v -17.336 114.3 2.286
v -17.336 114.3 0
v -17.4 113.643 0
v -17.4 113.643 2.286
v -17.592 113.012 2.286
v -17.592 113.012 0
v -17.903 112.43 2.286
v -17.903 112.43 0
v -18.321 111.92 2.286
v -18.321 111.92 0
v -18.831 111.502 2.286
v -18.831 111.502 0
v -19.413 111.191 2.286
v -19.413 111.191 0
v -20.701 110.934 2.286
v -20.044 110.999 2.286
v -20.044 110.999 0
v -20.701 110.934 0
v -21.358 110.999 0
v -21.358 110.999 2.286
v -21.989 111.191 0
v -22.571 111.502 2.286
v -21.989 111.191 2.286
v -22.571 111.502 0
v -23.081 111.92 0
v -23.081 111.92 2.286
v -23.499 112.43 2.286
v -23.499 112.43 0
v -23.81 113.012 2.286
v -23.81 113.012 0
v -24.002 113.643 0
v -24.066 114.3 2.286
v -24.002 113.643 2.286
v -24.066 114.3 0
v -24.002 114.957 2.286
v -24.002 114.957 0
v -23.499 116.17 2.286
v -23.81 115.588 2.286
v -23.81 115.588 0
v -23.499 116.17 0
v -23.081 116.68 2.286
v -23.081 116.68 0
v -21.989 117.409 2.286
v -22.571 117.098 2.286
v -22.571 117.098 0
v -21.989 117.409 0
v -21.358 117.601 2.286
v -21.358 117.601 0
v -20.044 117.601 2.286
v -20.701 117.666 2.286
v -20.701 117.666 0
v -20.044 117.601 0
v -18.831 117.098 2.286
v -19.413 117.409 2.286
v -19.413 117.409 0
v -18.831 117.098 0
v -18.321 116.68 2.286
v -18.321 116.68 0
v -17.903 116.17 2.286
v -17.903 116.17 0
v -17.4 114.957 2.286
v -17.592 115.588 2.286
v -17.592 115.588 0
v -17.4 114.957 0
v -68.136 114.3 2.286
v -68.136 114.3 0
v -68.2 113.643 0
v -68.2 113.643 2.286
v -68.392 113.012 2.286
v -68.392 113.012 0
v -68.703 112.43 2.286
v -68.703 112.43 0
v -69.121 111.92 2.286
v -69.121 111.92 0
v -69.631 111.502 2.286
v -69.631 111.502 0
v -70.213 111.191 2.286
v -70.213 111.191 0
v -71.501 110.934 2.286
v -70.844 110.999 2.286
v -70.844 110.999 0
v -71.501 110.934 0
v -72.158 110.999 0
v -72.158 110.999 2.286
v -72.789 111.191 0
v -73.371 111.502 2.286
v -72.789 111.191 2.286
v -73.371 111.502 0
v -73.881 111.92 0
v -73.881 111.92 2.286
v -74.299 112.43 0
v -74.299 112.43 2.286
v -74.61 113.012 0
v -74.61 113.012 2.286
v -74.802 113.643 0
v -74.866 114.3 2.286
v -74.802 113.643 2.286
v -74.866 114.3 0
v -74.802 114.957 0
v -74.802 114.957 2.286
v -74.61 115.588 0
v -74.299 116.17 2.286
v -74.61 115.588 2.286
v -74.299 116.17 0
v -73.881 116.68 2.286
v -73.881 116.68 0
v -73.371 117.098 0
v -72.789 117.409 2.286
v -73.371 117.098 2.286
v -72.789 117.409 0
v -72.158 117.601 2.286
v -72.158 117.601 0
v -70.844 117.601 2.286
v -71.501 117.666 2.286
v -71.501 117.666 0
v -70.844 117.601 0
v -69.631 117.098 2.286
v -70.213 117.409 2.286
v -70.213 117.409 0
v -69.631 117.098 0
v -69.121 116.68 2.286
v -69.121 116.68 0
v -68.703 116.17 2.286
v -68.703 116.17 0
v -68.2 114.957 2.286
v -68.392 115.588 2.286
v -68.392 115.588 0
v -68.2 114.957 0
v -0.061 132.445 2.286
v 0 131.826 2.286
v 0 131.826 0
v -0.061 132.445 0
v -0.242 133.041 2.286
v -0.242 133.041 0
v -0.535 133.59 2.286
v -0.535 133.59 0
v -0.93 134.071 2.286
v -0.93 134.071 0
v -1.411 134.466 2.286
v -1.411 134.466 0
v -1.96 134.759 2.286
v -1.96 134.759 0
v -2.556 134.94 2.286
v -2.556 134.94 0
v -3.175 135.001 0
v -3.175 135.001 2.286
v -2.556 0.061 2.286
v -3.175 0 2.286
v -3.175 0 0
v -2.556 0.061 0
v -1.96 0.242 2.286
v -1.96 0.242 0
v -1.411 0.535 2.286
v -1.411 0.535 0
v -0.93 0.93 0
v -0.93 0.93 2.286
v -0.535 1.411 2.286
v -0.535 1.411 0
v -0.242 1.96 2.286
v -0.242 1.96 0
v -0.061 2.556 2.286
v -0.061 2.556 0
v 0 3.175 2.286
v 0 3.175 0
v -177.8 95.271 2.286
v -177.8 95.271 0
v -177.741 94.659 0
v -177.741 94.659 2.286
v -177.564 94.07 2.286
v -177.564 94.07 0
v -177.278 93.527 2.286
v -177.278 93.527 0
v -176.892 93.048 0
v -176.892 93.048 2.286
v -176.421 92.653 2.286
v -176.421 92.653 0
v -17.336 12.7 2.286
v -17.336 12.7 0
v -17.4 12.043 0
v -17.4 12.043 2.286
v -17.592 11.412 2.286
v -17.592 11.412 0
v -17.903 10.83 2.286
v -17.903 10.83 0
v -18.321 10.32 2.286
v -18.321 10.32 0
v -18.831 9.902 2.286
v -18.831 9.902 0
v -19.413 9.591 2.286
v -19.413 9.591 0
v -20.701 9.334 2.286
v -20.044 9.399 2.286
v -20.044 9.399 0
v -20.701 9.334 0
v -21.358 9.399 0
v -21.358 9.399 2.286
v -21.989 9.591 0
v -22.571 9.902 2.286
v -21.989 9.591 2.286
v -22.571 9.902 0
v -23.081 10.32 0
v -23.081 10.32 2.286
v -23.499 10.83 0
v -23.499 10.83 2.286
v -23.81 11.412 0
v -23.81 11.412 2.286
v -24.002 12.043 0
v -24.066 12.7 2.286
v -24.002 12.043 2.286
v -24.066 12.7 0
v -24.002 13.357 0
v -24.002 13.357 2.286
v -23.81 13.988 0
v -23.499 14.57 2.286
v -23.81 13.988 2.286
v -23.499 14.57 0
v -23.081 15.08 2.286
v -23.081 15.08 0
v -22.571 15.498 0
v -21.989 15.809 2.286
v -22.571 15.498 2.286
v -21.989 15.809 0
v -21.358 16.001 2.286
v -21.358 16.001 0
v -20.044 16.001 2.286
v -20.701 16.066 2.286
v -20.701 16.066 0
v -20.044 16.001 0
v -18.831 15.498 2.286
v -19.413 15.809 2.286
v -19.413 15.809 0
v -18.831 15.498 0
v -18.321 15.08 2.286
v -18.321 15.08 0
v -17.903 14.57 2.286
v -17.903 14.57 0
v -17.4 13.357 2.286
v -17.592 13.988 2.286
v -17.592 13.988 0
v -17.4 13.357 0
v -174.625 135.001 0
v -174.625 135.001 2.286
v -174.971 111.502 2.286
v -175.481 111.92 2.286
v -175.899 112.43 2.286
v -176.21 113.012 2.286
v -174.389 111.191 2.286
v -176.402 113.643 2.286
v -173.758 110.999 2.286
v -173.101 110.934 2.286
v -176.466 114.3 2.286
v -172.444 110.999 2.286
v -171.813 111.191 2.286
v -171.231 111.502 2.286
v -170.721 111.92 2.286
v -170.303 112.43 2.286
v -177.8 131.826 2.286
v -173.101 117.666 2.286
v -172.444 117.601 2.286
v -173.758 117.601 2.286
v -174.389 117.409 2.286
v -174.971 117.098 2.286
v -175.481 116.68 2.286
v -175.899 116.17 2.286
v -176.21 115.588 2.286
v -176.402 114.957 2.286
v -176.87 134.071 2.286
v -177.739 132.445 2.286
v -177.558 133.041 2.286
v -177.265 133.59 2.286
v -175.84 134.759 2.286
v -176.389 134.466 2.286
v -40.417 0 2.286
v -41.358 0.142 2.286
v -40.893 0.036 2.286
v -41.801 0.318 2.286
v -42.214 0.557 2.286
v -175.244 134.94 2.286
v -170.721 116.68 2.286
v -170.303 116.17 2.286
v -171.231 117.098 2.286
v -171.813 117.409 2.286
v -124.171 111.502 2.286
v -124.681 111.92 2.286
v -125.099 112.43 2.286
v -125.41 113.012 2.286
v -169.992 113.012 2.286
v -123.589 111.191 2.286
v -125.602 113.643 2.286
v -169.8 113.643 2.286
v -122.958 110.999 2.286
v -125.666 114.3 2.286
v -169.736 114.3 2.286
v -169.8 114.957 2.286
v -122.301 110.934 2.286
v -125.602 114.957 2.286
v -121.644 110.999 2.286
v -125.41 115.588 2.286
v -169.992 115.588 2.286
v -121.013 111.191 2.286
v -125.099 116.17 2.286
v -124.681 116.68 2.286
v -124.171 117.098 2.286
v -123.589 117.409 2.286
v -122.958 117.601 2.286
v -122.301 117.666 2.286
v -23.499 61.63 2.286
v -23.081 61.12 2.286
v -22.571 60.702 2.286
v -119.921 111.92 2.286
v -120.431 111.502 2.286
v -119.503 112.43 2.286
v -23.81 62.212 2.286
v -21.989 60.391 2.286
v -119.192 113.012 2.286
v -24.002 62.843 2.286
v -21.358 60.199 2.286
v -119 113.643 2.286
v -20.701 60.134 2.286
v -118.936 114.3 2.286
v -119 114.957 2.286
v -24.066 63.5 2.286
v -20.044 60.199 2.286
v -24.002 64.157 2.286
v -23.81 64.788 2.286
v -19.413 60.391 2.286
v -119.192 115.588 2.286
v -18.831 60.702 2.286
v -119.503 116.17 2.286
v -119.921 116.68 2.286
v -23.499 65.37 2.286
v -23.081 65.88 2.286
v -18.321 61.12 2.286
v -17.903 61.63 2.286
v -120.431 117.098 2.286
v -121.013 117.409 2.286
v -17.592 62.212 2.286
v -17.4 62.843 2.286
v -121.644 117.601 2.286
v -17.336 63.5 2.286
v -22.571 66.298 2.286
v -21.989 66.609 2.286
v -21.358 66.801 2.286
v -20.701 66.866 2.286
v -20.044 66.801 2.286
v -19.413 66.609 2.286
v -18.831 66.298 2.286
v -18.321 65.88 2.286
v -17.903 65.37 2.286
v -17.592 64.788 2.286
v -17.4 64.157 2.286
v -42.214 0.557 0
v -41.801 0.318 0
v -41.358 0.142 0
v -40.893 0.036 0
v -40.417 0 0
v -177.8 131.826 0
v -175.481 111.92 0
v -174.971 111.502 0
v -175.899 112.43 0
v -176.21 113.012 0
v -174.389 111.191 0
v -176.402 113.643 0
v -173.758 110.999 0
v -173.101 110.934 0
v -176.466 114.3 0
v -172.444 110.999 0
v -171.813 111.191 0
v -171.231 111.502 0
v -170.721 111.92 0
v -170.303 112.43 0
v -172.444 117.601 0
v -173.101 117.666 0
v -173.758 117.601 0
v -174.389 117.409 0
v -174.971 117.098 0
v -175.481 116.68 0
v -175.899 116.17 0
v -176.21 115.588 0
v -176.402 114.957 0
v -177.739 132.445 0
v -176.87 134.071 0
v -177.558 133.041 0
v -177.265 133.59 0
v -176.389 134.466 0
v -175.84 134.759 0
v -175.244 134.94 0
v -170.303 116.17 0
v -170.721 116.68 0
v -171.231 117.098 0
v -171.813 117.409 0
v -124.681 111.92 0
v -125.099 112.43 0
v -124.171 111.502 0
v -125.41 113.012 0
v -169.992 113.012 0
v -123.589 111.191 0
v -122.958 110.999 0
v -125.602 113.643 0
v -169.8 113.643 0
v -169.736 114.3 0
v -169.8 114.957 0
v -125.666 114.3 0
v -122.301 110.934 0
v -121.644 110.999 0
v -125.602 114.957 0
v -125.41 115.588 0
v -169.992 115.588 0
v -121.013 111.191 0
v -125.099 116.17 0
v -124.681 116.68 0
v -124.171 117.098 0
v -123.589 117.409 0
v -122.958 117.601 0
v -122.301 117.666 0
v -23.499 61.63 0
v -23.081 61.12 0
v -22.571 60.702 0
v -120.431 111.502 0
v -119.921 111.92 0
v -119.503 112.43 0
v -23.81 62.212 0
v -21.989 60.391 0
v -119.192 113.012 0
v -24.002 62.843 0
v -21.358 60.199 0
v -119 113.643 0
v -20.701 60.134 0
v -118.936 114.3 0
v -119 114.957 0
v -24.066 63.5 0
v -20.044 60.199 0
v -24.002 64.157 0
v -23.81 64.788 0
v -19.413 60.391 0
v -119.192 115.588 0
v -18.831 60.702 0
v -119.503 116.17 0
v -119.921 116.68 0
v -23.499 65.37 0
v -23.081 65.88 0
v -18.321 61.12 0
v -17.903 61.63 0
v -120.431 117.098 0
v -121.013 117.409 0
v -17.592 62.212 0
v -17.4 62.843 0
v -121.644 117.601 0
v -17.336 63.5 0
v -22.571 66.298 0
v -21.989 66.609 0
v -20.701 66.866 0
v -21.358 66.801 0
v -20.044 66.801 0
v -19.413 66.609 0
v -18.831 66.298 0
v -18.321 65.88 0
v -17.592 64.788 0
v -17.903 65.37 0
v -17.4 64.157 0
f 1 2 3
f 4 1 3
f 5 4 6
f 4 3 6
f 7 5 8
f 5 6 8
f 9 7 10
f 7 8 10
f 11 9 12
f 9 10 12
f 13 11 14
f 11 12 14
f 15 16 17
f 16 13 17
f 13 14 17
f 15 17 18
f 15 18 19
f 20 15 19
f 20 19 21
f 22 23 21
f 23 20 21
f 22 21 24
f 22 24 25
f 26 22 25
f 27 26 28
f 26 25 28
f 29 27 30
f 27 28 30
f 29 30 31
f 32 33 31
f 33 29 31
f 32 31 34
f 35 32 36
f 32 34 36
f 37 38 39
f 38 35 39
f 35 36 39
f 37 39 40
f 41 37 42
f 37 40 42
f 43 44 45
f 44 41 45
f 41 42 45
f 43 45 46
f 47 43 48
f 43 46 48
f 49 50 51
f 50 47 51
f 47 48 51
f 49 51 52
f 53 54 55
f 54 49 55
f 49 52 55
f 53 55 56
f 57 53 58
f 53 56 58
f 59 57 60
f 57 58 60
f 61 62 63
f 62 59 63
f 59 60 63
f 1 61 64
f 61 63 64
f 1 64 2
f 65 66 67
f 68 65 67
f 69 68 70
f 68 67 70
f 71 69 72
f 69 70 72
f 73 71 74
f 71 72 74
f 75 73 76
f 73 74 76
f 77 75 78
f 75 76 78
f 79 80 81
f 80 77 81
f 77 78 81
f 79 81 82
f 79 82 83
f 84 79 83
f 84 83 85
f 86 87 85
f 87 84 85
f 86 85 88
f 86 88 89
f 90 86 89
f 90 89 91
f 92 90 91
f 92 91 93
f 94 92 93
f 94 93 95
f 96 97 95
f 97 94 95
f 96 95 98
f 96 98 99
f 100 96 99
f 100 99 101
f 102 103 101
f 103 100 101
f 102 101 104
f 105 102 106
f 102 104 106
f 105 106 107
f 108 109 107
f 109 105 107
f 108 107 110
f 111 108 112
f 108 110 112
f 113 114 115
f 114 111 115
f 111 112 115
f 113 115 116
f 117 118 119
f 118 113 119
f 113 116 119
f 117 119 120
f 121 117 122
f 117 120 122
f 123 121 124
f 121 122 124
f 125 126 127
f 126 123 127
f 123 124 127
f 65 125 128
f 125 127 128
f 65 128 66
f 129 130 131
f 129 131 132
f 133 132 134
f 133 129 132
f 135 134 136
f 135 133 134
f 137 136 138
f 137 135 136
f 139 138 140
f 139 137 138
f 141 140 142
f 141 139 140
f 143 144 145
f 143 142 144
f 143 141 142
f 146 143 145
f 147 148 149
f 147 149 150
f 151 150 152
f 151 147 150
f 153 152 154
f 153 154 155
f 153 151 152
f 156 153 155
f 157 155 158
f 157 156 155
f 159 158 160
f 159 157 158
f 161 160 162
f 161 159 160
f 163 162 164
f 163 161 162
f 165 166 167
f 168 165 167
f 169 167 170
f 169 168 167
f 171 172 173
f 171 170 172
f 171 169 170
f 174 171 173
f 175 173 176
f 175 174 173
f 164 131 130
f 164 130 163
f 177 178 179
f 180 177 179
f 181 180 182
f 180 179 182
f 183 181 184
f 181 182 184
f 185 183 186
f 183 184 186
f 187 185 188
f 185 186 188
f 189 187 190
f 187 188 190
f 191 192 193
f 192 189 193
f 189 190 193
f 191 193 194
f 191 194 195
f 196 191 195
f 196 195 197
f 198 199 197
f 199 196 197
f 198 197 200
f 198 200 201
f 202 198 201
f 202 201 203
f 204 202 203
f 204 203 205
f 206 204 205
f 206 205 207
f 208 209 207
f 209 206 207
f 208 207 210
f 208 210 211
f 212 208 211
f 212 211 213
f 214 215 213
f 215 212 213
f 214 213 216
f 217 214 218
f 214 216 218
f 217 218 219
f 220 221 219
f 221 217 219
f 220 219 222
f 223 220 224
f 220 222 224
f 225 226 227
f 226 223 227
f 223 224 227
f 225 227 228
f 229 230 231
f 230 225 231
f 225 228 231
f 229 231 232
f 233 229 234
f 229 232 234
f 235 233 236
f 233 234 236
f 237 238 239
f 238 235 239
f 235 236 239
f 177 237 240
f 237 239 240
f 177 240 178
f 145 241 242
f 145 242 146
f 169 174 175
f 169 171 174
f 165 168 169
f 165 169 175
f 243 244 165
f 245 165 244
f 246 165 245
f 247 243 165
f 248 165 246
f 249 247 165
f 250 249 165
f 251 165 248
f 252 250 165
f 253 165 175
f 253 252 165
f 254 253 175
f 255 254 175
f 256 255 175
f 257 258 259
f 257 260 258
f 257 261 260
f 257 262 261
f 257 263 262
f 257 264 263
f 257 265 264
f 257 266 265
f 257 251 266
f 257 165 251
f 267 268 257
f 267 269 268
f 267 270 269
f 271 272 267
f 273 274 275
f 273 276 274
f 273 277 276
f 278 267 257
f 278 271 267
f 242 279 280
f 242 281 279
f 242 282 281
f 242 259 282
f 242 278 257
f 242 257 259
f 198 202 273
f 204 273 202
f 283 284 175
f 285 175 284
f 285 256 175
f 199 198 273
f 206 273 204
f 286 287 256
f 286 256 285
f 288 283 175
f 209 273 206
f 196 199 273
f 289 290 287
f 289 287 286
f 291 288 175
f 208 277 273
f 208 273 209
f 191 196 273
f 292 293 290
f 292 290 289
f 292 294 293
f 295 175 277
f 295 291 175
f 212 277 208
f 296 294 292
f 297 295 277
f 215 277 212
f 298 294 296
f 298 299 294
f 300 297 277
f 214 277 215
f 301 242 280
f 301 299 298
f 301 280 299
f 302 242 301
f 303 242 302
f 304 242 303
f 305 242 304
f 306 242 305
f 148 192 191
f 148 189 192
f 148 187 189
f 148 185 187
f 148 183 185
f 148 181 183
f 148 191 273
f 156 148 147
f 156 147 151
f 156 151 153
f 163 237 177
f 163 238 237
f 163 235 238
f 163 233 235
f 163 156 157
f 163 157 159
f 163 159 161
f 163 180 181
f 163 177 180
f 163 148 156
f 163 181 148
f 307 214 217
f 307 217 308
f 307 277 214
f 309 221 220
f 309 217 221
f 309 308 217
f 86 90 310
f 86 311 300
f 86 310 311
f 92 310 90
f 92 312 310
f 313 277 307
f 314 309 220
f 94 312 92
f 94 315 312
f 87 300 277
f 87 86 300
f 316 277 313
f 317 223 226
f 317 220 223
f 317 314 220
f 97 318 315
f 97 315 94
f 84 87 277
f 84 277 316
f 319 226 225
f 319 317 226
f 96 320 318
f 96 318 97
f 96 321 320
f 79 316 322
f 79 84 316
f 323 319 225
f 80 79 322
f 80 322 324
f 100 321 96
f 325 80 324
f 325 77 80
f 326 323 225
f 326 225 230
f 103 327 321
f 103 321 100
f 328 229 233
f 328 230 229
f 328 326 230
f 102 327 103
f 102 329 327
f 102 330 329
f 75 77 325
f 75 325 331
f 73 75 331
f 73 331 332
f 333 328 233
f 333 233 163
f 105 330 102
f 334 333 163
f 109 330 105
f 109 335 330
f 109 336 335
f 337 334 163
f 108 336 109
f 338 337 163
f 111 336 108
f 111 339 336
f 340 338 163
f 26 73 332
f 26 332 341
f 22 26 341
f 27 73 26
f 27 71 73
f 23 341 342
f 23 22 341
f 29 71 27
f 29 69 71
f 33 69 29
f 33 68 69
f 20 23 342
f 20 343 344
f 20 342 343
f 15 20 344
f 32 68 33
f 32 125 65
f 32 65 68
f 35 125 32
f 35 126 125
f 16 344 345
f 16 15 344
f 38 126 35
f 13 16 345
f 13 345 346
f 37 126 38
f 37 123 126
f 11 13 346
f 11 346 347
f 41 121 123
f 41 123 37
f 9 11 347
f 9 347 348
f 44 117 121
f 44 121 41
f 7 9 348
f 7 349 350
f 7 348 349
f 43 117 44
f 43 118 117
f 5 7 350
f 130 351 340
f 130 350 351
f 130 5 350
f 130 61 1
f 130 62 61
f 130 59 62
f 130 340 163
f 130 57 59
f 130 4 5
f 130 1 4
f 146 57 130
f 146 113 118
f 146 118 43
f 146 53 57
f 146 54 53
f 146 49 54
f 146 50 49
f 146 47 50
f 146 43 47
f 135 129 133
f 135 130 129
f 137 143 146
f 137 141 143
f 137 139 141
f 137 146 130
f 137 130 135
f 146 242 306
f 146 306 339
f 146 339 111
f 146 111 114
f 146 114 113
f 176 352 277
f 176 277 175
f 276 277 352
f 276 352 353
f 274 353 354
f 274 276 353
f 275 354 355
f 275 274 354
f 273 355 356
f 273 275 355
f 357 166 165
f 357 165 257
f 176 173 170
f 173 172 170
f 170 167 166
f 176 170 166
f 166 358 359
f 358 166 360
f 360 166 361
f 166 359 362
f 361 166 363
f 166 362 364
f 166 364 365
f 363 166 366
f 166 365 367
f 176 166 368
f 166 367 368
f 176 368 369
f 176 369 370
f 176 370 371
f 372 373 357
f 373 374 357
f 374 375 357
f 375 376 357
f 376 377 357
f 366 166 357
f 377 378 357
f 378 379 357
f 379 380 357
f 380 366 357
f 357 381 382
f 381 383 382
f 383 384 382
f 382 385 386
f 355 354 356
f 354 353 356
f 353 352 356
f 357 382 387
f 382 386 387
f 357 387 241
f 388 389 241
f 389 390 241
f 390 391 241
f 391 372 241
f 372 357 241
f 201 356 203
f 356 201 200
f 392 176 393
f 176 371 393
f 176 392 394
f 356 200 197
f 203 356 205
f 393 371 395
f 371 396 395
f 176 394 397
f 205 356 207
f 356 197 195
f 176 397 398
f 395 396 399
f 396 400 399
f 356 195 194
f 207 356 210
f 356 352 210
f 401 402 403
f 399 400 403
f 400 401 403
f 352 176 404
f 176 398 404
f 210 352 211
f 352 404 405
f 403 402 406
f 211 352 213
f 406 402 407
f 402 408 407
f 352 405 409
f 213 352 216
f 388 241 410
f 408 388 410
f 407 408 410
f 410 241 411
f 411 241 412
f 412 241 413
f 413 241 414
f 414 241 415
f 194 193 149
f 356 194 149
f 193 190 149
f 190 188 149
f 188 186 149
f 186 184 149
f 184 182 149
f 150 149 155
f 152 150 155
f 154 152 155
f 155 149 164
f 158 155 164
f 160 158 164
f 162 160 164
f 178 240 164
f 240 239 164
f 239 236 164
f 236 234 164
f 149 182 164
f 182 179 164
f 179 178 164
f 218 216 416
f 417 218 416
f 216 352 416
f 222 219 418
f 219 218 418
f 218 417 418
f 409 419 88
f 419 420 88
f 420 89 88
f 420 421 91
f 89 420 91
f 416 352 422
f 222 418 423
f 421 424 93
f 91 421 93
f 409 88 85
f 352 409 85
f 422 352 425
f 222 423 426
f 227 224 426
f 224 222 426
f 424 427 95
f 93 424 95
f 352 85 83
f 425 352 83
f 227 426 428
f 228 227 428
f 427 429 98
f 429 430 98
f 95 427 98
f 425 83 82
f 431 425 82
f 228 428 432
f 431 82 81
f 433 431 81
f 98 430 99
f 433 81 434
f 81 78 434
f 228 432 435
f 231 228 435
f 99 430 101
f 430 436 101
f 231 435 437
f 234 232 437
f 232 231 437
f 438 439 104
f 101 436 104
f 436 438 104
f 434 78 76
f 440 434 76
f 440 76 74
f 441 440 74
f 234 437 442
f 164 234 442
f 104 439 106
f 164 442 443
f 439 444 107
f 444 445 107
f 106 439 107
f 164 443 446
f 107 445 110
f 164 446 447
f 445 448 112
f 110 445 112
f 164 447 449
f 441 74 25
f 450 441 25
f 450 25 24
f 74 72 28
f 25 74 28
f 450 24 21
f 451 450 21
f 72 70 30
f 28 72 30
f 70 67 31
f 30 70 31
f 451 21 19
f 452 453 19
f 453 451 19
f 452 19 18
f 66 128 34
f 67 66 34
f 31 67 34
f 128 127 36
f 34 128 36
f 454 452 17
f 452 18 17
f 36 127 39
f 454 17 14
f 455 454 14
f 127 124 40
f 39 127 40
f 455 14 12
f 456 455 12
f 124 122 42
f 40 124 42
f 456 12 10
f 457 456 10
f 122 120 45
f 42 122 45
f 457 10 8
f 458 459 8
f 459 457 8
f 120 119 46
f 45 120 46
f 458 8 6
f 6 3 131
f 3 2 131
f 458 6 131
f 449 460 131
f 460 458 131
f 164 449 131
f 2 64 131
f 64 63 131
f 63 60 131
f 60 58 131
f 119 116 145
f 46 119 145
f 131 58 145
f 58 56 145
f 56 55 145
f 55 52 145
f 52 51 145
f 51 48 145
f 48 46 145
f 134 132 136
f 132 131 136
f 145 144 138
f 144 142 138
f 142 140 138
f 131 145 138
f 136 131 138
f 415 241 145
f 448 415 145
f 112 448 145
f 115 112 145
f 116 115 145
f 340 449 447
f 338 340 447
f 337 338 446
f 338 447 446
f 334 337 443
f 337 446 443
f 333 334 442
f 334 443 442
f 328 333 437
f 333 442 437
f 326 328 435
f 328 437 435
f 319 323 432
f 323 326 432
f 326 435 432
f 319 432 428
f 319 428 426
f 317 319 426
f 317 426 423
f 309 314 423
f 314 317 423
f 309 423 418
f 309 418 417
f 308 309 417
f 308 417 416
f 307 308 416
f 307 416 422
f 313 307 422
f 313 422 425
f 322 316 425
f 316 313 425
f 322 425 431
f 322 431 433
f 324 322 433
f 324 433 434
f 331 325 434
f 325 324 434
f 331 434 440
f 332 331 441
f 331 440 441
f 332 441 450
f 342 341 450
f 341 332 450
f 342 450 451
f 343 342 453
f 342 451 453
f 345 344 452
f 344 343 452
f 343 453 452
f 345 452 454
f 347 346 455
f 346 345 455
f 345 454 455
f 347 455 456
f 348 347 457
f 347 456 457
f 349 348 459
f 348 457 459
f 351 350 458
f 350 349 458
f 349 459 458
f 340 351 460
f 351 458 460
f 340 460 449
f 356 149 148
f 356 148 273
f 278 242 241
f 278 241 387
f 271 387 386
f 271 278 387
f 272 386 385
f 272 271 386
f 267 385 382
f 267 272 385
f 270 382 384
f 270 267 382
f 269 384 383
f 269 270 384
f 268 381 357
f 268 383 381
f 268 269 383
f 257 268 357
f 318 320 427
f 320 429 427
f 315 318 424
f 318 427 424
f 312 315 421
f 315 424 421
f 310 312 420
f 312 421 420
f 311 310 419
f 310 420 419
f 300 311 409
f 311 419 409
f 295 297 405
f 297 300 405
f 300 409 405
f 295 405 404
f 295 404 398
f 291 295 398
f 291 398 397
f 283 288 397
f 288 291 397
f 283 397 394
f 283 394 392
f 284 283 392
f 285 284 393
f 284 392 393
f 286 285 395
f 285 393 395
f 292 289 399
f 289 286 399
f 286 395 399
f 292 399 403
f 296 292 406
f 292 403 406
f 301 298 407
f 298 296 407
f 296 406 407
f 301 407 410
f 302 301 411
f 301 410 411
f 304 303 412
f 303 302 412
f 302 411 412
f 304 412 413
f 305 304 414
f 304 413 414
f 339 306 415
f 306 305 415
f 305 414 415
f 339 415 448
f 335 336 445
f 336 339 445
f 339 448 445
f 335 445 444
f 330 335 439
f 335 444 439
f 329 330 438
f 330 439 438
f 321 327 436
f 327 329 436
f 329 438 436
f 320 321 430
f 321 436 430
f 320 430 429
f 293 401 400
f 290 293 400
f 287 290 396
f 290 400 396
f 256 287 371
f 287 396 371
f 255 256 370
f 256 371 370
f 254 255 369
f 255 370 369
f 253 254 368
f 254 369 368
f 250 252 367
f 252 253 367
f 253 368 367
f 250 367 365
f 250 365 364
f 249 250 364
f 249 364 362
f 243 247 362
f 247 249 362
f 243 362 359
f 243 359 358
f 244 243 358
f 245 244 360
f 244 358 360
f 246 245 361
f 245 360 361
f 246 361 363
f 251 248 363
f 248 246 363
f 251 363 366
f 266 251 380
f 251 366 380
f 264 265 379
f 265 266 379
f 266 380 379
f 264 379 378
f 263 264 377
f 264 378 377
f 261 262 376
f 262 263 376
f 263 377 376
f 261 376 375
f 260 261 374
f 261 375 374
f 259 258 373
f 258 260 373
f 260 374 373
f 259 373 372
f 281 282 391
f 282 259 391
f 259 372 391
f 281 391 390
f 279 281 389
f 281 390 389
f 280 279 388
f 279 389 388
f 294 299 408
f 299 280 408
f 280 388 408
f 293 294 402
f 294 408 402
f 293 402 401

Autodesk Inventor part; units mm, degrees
ref_plane "YZ Plane" through (0, 0, 0) normal (1, 0, 0) x (0, 1, 0)
ref_plane "XZ Plane" through (0, 0, 0) normal (0, 1, 0) x (-1, 0, 0)
ref_plane "XY Plane" through (0, 0, 0) normal (0, 0, 1) x (1, 0, 0)
sketch "Sketch1" plane through (0, 0, 0) normal (0, 0, 1) x (1, 0, 0)
  line L0 (0, 0) -> (-41.402, 0)
  line L1 (-41.402, 0) -> (-177.8, 93.599)
  line L2 (-177.8, 93.599) -> (-177.8, 135.001)
  line L3 (-177.8, 135.001) -> (0, 135.001)
  line L4 (0, 135.001) -> (0, 0)
  circle A0 centre (-20.701, 12.7) radius 3.3655
  circle A1 centre (-20.701, 63.5) radius 3.3655
  circle A2 centre (-20.701, 114.3) radius 3.3655
  circle A3 centre (-71.501, 114.3) radius 3.3655
  circle A4 centre (-122.301, 114.3) radius 3.3655
  circle A5 centre (-173.101, 114.3) radius 3.3655
  dimension "d0" = 41.402
  dimension "d1" = 41.402
  dimension "d2" = 177.8
  dimension "d3" = 135.001
  dimension "d4" = 6.731
  dimension "d6" = 20.701
  dimension "d9" = 50.8
  dimension "d14" = 20.701
  dimension "d15" = 20.701
  dimension "d16" = 50.8
  dimension "d17" = 12.7
  dimension "d20" = 50.8
  dimension "d25" = 4.699
extrude "Extrusion1" add sketch "Sketch1" along normal blind 2.286
fillet "Fillet1" radius 3.175 5 edges at (0, 135.001, 1.143) (0, 0, 1.143) (-41.402, 0, 1.143) (-177.8, 93.599, 1.143) (-177.8, 135.001, 1.143)
sketch "Sketch2" plane through (0, 0, 2.286) normal (0, 0, 1) x (1, 0, 0)
  point P0 (0, 0)
properties part number "super5" material "Aluminum 6061"
